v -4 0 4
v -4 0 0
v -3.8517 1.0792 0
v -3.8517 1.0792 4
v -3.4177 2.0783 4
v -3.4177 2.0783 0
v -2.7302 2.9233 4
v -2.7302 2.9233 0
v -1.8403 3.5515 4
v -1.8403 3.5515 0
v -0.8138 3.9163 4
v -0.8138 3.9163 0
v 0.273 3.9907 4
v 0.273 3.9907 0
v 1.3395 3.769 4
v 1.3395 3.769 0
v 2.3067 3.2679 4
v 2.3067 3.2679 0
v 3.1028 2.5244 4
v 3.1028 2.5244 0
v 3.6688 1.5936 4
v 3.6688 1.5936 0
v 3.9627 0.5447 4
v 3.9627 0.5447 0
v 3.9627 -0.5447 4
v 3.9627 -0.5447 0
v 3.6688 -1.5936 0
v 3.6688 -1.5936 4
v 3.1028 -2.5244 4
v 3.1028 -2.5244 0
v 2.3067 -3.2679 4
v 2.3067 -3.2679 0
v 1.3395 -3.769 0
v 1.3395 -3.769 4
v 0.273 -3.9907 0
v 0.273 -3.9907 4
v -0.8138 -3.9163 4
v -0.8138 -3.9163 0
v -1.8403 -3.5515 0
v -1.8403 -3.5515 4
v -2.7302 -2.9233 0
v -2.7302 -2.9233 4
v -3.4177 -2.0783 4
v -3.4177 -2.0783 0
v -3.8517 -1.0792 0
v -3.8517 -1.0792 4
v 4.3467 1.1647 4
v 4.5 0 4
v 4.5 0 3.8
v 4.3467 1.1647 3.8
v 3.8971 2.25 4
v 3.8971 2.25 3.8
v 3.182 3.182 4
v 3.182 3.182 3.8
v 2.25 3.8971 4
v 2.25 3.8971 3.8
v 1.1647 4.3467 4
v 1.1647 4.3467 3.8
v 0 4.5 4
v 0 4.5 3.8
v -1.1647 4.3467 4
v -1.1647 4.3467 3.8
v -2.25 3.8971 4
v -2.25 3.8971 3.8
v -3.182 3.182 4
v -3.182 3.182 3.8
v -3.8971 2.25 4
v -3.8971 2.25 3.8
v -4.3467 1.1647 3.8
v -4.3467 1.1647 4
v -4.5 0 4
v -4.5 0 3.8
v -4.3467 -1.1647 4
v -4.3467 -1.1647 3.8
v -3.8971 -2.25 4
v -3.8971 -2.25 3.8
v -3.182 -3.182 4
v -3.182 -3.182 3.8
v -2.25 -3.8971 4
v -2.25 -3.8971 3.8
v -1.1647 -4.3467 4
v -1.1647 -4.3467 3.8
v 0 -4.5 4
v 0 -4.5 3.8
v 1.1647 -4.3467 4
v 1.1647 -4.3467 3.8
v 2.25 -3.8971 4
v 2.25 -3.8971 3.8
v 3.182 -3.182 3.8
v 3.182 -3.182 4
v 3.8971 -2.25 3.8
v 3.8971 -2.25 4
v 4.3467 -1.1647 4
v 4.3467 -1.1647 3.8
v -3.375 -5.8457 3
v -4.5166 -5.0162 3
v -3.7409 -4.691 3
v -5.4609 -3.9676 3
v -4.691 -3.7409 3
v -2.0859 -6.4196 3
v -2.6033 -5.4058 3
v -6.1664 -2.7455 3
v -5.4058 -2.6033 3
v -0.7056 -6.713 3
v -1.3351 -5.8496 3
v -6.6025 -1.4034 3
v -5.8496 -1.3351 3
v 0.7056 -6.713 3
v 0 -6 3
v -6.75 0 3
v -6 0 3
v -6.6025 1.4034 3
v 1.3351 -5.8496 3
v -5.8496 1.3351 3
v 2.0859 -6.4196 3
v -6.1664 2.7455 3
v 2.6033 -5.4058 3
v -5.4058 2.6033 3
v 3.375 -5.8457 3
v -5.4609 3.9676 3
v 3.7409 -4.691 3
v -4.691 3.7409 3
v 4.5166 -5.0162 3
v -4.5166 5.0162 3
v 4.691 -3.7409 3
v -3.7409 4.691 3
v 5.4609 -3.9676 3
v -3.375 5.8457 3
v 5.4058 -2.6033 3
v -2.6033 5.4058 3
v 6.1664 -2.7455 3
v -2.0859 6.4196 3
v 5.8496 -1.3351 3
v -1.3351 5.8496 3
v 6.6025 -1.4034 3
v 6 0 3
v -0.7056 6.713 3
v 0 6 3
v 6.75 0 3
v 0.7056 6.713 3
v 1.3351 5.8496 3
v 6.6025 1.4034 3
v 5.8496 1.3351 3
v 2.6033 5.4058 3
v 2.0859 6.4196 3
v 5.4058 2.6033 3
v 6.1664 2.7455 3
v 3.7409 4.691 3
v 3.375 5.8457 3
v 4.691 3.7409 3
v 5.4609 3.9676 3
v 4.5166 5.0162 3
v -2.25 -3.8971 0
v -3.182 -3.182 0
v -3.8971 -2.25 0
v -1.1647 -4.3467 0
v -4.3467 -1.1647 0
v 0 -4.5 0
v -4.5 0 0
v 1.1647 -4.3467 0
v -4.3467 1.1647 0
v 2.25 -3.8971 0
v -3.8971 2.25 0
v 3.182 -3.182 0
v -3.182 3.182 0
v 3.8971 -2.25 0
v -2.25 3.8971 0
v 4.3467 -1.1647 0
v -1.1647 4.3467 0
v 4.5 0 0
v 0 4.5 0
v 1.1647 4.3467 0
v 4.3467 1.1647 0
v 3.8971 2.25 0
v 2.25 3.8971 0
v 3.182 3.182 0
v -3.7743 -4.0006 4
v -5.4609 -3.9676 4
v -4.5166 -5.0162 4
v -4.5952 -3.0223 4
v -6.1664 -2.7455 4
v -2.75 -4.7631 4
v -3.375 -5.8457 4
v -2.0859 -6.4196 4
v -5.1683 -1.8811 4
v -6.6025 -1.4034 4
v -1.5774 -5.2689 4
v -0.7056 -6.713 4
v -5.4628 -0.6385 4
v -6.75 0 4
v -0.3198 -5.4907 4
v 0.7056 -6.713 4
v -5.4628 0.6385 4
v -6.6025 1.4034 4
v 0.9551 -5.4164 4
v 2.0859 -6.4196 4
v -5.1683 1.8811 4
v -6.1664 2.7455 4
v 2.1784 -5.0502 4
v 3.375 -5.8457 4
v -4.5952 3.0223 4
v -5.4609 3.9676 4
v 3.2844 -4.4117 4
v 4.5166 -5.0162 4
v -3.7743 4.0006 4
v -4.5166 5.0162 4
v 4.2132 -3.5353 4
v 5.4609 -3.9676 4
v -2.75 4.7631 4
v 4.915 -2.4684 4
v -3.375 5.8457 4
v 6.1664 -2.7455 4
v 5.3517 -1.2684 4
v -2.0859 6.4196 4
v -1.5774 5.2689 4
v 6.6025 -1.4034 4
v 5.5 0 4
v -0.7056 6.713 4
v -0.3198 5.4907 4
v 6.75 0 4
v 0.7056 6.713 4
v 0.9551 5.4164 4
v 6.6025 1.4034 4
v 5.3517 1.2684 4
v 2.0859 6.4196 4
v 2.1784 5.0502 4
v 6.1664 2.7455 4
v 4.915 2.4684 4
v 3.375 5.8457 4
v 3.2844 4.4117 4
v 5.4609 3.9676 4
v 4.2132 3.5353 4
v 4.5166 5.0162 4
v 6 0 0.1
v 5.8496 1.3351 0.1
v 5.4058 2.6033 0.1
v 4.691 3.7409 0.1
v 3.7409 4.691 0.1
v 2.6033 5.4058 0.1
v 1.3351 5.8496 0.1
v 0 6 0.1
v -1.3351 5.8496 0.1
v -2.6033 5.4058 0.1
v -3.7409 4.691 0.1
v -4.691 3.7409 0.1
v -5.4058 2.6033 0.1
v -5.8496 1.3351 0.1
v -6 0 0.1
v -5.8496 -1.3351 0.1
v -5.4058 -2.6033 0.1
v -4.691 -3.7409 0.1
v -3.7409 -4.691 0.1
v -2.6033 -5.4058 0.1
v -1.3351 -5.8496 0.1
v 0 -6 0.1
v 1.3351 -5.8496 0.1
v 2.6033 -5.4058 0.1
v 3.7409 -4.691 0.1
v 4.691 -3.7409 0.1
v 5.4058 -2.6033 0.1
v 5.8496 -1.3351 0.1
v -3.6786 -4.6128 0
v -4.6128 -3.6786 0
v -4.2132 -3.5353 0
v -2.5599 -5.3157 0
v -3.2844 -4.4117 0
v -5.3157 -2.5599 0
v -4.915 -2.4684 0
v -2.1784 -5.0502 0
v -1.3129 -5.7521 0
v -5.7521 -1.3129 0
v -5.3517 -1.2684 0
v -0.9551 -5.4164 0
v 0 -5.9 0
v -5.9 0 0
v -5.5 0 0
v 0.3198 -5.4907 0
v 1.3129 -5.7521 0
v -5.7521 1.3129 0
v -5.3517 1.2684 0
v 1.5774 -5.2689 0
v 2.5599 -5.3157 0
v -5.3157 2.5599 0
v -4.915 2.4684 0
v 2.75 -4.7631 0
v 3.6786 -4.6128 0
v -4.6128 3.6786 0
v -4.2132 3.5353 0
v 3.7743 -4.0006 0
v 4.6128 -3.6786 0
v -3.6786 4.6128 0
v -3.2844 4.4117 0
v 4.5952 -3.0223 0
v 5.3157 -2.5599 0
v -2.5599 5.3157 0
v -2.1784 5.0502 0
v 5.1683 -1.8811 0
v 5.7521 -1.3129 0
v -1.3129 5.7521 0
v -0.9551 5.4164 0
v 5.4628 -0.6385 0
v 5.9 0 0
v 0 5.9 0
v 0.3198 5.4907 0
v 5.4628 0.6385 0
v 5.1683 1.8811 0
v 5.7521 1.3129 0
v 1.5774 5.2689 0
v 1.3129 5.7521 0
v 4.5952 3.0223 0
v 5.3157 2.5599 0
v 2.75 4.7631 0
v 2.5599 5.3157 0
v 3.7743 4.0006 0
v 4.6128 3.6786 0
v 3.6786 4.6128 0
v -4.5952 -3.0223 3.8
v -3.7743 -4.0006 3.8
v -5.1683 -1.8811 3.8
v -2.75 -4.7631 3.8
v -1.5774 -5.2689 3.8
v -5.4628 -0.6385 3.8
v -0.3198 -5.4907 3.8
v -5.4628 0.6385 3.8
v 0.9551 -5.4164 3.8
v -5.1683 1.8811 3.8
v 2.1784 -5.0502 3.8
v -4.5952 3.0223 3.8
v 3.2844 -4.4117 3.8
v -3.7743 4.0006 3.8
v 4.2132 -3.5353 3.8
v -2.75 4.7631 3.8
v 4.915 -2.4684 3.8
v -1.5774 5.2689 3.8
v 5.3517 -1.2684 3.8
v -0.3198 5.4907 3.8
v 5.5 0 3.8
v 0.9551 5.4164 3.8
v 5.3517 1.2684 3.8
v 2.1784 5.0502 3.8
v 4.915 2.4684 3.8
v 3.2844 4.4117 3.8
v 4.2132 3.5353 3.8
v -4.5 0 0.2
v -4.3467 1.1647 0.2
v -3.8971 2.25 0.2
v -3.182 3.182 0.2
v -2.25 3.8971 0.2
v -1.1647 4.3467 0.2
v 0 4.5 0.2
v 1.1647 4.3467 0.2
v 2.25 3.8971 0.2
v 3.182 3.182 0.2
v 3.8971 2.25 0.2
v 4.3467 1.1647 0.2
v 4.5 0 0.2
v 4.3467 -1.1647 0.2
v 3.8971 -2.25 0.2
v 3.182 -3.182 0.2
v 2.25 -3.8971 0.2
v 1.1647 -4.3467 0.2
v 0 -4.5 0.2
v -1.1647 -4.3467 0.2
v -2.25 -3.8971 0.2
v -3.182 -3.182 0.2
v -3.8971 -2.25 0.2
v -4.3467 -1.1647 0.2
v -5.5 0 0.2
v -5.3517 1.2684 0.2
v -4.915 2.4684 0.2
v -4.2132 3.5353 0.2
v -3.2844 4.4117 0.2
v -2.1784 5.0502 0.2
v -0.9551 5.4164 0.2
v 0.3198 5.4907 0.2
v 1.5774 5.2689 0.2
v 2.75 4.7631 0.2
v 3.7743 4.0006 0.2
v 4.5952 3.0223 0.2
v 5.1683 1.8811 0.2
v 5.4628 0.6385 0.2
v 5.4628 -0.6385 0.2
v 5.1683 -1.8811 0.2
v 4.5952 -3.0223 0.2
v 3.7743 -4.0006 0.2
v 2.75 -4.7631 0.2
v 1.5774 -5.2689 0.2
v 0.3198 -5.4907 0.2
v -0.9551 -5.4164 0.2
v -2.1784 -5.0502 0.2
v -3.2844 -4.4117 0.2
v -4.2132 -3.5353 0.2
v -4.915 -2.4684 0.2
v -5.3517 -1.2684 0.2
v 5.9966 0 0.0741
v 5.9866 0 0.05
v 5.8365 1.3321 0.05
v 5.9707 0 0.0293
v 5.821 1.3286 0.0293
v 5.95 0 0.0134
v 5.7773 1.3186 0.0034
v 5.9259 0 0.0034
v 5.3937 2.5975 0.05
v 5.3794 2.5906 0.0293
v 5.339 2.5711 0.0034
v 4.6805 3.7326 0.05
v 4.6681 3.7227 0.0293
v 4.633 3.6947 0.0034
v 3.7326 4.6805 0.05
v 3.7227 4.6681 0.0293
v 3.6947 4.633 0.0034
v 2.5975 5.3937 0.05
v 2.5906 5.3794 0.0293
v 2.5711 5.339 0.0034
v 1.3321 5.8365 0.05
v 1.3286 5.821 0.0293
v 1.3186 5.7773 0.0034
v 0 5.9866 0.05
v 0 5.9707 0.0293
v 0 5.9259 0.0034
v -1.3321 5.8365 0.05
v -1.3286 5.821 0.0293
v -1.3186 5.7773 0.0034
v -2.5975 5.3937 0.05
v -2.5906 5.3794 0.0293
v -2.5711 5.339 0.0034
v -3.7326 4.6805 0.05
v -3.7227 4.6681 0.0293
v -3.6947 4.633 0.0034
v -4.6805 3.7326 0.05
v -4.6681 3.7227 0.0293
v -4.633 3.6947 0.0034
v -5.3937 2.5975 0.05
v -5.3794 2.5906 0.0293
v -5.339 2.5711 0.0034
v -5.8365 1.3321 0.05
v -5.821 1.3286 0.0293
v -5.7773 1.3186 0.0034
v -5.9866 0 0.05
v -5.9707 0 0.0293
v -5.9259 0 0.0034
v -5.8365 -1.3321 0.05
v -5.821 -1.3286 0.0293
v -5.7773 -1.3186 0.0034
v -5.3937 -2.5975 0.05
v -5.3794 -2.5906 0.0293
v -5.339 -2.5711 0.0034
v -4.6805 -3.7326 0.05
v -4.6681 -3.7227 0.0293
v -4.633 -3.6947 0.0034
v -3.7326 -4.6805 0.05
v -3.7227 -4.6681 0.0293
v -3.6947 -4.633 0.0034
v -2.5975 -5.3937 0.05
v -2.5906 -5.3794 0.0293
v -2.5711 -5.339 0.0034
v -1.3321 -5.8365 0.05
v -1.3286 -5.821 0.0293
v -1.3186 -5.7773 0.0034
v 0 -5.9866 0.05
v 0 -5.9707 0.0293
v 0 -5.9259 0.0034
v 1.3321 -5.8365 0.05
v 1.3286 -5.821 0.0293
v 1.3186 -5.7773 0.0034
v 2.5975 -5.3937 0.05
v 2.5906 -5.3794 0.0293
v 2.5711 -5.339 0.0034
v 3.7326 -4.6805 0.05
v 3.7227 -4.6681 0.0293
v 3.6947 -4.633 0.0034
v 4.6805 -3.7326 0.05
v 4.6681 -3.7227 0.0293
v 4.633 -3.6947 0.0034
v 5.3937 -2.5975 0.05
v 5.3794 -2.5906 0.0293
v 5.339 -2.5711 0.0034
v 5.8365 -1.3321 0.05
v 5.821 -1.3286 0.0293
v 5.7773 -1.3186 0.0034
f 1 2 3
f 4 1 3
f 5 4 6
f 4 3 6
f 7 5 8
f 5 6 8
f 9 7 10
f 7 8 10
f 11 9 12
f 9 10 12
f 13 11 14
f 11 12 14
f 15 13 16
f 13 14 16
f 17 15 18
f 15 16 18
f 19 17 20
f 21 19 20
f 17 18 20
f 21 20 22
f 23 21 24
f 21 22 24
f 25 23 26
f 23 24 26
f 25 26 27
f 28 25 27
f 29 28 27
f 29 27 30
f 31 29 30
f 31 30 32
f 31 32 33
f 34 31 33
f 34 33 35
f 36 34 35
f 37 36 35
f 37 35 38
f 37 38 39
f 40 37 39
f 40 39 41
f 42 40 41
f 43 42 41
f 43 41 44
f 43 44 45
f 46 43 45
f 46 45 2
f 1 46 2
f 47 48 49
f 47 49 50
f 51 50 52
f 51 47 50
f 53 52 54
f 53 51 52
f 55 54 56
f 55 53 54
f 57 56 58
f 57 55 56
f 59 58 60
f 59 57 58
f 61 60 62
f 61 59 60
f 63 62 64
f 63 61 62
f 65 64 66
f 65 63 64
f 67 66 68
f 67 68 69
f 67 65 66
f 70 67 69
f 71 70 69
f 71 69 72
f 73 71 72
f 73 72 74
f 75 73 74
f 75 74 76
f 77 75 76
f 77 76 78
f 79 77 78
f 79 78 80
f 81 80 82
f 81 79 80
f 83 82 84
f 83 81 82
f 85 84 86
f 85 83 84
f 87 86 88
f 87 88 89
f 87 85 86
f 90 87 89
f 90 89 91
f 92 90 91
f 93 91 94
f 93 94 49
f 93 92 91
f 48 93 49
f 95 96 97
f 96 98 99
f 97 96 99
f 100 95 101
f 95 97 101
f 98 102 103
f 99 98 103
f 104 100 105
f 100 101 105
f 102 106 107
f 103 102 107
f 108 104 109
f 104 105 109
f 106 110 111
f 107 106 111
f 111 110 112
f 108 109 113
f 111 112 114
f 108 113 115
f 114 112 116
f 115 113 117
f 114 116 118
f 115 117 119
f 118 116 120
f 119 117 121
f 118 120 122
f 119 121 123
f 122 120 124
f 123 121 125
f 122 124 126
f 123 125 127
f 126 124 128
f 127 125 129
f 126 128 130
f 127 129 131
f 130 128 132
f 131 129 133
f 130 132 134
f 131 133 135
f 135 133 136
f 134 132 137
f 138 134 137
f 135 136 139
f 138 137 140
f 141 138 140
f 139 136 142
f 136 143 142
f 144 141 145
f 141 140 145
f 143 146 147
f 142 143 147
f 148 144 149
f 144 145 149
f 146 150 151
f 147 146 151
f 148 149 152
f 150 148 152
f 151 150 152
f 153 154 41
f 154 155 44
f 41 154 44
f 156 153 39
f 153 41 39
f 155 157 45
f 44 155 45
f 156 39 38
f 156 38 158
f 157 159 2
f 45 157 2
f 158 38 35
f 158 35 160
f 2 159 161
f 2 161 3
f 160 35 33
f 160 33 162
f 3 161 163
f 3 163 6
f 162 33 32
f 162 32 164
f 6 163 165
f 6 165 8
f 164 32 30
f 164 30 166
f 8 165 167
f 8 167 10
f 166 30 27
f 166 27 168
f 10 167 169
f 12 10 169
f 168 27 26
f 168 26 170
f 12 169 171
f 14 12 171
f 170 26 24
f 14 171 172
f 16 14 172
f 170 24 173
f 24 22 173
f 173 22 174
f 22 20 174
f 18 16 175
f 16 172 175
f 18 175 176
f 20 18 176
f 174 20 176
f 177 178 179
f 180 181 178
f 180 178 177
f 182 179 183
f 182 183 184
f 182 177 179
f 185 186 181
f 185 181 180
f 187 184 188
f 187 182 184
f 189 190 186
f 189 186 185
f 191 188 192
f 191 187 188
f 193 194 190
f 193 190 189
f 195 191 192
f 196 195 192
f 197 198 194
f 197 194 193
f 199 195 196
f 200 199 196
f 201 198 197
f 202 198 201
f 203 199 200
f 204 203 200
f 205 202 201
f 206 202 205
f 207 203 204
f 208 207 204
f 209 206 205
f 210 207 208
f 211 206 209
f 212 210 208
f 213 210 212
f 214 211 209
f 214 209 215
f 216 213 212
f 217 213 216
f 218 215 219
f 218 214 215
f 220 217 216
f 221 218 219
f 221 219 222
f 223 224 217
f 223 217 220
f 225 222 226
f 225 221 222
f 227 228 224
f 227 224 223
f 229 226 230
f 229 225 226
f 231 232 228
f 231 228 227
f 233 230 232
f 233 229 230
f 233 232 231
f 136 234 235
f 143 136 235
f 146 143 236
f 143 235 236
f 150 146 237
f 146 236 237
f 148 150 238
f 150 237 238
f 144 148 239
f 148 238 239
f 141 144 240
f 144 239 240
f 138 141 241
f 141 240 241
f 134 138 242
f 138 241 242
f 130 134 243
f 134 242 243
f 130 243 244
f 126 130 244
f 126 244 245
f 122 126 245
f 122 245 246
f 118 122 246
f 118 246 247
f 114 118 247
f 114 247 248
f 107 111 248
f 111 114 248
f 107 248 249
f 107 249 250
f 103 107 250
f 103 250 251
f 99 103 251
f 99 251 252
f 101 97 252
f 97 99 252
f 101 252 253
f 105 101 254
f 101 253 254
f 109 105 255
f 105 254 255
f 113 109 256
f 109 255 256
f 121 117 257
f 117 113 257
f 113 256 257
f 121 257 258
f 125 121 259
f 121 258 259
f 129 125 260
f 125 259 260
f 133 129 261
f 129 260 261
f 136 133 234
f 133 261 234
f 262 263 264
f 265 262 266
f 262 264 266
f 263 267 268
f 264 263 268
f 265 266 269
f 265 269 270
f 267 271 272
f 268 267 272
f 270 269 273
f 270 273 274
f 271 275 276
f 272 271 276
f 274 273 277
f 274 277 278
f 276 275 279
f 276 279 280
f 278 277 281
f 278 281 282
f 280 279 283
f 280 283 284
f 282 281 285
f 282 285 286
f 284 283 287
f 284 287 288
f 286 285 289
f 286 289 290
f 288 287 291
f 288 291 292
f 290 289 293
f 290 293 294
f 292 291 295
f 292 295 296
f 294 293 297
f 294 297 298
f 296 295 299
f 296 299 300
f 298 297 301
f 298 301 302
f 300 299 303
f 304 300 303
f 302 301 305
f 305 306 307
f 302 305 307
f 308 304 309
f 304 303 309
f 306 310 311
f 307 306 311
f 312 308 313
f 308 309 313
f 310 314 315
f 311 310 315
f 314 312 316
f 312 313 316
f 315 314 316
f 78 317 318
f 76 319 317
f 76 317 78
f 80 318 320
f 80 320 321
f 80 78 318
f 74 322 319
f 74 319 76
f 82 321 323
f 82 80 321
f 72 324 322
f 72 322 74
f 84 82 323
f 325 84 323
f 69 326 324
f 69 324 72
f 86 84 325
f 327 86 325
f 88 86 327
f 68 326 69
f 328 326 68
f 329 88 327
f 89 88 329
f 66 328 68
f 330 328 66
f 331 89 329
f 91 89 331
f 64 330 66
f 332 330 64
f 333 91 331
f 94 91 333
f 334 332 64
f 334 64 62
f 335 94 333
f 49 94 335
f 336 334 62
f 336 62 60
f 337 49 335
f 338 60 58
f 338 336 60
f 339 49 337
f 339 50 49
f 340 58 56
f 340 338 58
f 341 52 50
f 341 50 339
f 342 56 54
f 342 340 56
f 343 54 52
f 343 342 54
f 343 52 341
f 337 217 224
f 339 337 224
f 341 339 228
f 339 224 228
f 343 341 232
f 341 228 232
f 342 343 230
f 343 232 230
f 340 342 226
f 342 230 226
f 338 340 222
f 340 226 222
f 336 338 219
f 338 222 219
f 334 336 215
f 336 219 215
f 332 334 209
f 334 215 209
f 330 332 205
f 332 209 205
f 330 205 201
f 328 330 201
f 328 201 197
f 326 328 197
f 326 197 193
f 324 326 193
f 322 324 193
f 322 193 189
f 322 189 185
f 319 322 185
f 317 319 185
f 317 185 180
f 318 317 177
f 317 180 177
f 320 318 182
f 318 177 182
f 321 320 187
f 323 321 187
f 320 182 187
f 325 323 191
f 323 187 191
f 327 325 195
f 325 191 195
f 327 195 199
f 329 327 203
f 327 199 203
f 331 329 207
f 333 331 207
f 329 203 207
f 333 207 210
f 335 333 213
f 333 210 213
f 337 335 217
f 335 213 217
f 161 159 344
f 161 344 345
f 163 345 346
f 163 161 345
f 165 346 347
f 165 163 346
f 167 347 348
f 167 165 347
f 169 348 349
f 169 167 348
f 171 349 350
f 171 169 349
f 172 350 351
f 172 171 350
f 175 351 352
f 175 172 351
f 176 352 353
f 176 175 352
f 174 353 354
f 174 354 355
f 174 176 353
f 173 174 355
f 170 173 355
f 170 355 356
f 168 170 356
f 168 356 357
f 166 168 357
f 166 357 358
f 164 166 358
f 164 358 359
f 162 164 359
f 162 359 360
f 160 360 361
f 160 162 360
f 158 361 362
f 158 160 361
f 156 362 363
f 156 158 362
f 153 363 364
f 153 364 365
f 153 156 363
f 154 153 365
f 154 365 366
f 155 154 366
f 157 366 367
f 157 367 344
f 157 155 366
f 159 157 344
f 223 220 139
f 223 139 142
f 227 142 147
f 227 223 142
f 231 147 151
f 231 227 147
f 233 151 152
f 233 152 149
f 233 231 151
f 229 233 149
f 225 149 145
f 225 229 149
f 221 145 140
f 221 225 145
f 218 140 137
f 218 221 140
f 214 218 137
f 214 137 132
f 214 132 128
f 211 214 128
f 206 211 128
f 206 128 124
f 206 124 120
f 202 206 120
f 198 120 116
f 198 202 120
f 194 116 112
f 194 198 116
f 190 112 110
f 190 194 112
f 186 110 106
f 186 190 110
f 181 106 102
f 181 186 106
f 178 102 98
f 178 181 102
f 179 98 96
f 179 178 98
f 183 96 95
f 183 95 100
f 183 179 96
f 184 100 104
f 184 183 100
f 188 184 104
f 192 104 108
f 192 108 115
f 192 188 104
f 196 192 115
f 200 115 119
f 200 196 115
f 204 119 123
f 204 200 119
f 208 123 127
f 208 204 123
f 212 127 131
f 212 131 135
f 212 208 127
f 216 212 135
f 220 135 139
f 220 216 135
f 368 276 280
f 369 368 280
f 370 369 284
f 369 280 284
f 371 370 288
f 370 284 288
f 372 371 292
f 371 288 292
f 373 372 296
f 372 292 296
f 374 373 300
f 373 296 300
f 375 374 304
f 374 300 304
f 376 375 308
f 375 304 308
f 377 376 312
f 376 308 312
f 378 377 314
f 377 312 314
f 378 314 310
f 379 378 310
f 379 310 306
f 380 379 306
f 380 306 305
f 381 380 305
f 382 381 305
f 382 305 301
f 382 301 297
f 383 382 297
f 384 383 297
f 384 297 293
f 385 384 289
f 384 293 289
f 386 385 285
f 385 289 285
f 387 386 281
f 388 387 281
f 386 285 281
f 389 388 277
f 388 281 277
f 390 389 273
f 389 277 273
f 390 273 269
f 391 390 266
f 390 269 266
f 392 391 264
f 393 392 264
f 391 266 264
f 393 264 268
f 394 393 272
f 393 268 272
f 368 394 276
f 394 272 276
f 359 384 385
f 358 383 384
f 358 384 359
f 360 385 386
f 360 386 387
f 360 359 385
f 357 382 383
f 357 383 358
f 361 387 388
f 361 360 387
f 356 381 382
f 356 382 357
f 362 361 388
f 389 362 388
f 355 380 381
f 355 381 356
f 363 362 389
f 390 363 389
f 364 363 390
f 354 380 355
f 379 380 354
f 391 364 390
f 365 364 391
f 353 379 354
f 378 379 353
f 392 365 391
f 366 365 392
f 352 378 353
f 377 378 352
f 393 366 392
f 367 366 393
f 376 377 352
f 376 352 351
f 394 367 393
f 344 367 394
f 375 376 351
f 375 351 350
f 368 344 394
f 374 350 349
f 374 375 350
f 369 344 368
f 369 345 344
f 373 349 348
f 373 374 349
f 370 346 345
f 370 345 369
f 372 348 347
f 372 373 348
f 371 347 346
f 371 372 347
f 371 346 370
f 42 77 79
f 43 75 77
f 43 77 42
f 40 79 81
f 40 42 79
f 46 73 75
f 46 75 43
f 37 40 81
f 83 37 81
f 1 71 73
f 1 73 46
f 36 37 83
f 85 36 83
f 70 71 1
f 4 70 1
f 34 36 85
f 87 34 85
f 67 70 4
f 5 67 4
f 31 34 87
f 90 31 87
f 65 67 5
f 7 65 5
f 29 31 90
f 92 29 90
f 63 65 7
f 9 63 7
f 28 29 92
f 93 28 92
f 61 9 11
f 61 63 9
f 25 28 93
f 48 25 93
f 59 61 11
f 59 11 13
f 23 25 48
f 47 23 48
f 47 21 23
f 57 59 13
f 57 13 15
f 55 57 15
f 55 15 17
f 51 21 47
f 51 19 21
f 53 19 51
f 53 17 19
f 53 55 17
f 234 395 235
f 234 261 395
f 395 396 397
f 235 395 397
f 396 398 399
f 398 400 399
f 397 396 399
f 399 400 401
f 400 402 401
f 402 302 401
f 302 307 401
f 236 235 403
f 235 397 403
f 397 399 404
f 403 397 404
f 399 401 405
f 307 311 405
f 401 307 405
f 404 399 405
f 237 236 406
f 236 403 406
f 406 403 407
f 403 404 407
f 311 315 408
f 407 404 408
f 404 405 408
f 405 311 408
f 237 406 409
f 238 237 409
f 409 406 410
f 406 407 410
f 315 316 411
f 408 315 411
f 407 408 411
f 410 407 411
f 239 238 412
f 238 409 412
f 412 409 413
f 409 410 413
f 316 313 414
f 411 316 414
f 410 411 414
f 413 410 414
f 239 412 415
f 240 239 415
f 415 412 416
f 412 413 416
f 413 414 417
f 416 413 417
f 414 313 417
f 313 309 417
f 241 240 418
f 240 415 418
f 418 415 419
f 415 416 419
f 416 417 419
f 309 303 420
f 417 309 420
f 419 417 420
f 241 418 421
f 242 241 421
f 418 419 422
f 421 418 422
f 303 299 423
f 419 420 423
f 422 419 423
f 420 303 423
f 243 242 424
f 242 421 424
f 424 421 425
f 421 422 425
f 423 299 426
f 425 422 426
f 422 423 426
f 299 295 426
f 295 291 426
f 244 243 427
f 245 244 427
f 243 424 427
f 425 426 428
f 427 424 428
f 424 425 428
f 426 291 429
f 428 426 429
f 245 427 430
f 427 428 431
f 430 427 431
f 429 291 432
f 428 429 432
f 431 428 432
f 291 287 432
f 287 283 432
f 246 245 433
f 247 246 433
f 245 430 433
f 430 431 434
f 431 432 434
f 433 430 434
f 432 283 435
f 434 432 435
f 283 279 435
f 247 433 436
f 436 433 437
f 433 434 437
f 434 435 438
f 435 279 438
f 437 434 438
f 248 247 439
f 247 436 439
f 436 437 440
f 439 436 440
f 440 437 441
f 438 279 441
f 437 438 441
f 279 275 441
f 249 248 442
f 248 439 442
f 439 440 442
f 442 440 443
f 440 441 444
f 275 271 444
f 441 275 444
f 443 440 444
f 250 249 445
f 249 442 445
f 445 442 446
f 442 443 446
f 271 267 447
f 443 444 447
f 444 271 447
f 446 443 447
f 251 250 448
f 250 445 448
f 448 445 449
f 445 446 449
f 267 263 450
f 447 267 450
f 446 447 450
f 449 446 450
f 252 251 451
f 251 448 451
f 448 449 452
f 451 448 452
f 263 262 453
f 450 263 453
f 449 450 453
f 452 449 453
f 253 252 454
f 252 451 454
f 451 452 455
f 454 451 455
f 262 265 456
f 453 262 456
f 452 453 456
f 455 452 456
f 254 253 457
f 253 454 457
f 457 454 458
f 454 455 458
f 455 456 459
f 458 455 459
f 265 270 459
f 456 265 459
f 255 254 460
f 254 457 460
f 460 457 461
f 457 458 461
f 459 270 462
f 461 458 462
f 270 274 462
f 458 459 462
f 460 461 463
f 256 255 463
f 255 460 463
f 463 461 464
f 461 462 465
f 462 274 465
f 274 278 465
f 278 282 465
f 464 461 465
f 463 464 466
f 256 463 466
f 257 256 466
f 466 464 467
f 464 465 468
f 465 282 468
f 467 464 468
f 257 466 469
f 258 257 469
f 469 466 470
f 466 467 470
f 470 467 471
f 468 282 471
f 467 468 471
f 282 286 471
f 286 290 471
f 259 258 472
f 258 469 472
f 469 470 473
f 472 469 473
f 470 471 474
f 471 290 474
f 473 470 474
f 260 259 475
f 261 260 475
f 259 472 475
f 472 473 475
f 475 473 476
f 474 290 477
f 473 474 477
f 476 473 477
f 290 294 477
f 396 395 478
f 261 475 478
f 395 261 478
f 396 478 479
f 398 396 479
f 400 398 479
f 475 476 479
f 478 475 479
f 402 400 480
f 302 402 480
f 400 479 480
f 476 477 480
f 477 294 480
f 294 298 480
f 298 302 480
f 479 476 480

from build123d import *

# Parameters (mm, degrees)
SKETCH_1_R          = 6
EXTRUDE_1_DEPTH     = 4
SKETCH_2_R          = 6.75
EXTRUDE_2_DEPTH     = 1
SKETCH_3_R          = 4
CUT_EXTRUDE_1_DEPTH = 5
SKETCH_4_R          = 5.5
SKETCH_4_R_2        = 4.5
CUT_EXTRUDE_2_DEPTH = 0.2
SKETCH_5_R          = 5.5
SKETCH_5_R_2        = 4.5
CUT_EXTRUDE_3_DEPTH = 0.2
FILLET_1_R          = 0.1


with BuildPart() as part:
    # 草圖1 → 填料-伸長1 (new body)
    with BuildSketch(Plane.XY):
        Circle(SKETCH_1_R)
    extrude(amount=EXTRUDE_1_DEPTH)

    # 草圖2 → 填料-伸長2 (add)
    with BuildSketch(Plane.XY.offset(4)):
        Circle(SKETCH_2_R)
    extrude(amount=-EXTRUDE_2_DEPTH)

    # 草圖3 → 除料-伸長1 (cut, through all)
    with BuildSketch(Plane(origin=(0, 0, 0), x_dir=(-1, 0, 0), z_dir=(0, 0, -1))):
        Circle(SKETCH_3_R)
    extrude(amount=-CUT_EXTRUDE_1_DEPTH, mode=Mode.SUBTRACT)

    # 草圖4 → 除料-伸長2 (cut)
    with BuildSketch(Plane(origin=(0, 0, 0), x_dir=(-1, 0, 0), z_dir=(0, 0, -1))):
        Circle(SKETCH_4_R)
        Circle(SKETCH_4_R_2, mode=Mode.SUBTRACT)
    extrude(amount=-CUT_EXTRUDE_2_DEPTH, mode=Mode.SUBTRACT)

    # 草圖5 → 除料-伸長3 (cut)
    with BuildSketch(Plane.XY.offset(4)):
        Circle(SKETCH_5_R)
        Circle(SKETCH_5_R_2, mode=Mode.SUBTRACT)
    extrude(amount=-CUT_EXTRUDE_3_DEPTH, mode=Mode.SUBTRACT)

    # 圓角1
    fillet_1_edges = [part.edges().sort_by_distance(p)[0] for p in [
        (-6, 0, 0),
    ]]
    fillet(fillet_1_edges, radius=FILLET_1_R)


solid = part.part
